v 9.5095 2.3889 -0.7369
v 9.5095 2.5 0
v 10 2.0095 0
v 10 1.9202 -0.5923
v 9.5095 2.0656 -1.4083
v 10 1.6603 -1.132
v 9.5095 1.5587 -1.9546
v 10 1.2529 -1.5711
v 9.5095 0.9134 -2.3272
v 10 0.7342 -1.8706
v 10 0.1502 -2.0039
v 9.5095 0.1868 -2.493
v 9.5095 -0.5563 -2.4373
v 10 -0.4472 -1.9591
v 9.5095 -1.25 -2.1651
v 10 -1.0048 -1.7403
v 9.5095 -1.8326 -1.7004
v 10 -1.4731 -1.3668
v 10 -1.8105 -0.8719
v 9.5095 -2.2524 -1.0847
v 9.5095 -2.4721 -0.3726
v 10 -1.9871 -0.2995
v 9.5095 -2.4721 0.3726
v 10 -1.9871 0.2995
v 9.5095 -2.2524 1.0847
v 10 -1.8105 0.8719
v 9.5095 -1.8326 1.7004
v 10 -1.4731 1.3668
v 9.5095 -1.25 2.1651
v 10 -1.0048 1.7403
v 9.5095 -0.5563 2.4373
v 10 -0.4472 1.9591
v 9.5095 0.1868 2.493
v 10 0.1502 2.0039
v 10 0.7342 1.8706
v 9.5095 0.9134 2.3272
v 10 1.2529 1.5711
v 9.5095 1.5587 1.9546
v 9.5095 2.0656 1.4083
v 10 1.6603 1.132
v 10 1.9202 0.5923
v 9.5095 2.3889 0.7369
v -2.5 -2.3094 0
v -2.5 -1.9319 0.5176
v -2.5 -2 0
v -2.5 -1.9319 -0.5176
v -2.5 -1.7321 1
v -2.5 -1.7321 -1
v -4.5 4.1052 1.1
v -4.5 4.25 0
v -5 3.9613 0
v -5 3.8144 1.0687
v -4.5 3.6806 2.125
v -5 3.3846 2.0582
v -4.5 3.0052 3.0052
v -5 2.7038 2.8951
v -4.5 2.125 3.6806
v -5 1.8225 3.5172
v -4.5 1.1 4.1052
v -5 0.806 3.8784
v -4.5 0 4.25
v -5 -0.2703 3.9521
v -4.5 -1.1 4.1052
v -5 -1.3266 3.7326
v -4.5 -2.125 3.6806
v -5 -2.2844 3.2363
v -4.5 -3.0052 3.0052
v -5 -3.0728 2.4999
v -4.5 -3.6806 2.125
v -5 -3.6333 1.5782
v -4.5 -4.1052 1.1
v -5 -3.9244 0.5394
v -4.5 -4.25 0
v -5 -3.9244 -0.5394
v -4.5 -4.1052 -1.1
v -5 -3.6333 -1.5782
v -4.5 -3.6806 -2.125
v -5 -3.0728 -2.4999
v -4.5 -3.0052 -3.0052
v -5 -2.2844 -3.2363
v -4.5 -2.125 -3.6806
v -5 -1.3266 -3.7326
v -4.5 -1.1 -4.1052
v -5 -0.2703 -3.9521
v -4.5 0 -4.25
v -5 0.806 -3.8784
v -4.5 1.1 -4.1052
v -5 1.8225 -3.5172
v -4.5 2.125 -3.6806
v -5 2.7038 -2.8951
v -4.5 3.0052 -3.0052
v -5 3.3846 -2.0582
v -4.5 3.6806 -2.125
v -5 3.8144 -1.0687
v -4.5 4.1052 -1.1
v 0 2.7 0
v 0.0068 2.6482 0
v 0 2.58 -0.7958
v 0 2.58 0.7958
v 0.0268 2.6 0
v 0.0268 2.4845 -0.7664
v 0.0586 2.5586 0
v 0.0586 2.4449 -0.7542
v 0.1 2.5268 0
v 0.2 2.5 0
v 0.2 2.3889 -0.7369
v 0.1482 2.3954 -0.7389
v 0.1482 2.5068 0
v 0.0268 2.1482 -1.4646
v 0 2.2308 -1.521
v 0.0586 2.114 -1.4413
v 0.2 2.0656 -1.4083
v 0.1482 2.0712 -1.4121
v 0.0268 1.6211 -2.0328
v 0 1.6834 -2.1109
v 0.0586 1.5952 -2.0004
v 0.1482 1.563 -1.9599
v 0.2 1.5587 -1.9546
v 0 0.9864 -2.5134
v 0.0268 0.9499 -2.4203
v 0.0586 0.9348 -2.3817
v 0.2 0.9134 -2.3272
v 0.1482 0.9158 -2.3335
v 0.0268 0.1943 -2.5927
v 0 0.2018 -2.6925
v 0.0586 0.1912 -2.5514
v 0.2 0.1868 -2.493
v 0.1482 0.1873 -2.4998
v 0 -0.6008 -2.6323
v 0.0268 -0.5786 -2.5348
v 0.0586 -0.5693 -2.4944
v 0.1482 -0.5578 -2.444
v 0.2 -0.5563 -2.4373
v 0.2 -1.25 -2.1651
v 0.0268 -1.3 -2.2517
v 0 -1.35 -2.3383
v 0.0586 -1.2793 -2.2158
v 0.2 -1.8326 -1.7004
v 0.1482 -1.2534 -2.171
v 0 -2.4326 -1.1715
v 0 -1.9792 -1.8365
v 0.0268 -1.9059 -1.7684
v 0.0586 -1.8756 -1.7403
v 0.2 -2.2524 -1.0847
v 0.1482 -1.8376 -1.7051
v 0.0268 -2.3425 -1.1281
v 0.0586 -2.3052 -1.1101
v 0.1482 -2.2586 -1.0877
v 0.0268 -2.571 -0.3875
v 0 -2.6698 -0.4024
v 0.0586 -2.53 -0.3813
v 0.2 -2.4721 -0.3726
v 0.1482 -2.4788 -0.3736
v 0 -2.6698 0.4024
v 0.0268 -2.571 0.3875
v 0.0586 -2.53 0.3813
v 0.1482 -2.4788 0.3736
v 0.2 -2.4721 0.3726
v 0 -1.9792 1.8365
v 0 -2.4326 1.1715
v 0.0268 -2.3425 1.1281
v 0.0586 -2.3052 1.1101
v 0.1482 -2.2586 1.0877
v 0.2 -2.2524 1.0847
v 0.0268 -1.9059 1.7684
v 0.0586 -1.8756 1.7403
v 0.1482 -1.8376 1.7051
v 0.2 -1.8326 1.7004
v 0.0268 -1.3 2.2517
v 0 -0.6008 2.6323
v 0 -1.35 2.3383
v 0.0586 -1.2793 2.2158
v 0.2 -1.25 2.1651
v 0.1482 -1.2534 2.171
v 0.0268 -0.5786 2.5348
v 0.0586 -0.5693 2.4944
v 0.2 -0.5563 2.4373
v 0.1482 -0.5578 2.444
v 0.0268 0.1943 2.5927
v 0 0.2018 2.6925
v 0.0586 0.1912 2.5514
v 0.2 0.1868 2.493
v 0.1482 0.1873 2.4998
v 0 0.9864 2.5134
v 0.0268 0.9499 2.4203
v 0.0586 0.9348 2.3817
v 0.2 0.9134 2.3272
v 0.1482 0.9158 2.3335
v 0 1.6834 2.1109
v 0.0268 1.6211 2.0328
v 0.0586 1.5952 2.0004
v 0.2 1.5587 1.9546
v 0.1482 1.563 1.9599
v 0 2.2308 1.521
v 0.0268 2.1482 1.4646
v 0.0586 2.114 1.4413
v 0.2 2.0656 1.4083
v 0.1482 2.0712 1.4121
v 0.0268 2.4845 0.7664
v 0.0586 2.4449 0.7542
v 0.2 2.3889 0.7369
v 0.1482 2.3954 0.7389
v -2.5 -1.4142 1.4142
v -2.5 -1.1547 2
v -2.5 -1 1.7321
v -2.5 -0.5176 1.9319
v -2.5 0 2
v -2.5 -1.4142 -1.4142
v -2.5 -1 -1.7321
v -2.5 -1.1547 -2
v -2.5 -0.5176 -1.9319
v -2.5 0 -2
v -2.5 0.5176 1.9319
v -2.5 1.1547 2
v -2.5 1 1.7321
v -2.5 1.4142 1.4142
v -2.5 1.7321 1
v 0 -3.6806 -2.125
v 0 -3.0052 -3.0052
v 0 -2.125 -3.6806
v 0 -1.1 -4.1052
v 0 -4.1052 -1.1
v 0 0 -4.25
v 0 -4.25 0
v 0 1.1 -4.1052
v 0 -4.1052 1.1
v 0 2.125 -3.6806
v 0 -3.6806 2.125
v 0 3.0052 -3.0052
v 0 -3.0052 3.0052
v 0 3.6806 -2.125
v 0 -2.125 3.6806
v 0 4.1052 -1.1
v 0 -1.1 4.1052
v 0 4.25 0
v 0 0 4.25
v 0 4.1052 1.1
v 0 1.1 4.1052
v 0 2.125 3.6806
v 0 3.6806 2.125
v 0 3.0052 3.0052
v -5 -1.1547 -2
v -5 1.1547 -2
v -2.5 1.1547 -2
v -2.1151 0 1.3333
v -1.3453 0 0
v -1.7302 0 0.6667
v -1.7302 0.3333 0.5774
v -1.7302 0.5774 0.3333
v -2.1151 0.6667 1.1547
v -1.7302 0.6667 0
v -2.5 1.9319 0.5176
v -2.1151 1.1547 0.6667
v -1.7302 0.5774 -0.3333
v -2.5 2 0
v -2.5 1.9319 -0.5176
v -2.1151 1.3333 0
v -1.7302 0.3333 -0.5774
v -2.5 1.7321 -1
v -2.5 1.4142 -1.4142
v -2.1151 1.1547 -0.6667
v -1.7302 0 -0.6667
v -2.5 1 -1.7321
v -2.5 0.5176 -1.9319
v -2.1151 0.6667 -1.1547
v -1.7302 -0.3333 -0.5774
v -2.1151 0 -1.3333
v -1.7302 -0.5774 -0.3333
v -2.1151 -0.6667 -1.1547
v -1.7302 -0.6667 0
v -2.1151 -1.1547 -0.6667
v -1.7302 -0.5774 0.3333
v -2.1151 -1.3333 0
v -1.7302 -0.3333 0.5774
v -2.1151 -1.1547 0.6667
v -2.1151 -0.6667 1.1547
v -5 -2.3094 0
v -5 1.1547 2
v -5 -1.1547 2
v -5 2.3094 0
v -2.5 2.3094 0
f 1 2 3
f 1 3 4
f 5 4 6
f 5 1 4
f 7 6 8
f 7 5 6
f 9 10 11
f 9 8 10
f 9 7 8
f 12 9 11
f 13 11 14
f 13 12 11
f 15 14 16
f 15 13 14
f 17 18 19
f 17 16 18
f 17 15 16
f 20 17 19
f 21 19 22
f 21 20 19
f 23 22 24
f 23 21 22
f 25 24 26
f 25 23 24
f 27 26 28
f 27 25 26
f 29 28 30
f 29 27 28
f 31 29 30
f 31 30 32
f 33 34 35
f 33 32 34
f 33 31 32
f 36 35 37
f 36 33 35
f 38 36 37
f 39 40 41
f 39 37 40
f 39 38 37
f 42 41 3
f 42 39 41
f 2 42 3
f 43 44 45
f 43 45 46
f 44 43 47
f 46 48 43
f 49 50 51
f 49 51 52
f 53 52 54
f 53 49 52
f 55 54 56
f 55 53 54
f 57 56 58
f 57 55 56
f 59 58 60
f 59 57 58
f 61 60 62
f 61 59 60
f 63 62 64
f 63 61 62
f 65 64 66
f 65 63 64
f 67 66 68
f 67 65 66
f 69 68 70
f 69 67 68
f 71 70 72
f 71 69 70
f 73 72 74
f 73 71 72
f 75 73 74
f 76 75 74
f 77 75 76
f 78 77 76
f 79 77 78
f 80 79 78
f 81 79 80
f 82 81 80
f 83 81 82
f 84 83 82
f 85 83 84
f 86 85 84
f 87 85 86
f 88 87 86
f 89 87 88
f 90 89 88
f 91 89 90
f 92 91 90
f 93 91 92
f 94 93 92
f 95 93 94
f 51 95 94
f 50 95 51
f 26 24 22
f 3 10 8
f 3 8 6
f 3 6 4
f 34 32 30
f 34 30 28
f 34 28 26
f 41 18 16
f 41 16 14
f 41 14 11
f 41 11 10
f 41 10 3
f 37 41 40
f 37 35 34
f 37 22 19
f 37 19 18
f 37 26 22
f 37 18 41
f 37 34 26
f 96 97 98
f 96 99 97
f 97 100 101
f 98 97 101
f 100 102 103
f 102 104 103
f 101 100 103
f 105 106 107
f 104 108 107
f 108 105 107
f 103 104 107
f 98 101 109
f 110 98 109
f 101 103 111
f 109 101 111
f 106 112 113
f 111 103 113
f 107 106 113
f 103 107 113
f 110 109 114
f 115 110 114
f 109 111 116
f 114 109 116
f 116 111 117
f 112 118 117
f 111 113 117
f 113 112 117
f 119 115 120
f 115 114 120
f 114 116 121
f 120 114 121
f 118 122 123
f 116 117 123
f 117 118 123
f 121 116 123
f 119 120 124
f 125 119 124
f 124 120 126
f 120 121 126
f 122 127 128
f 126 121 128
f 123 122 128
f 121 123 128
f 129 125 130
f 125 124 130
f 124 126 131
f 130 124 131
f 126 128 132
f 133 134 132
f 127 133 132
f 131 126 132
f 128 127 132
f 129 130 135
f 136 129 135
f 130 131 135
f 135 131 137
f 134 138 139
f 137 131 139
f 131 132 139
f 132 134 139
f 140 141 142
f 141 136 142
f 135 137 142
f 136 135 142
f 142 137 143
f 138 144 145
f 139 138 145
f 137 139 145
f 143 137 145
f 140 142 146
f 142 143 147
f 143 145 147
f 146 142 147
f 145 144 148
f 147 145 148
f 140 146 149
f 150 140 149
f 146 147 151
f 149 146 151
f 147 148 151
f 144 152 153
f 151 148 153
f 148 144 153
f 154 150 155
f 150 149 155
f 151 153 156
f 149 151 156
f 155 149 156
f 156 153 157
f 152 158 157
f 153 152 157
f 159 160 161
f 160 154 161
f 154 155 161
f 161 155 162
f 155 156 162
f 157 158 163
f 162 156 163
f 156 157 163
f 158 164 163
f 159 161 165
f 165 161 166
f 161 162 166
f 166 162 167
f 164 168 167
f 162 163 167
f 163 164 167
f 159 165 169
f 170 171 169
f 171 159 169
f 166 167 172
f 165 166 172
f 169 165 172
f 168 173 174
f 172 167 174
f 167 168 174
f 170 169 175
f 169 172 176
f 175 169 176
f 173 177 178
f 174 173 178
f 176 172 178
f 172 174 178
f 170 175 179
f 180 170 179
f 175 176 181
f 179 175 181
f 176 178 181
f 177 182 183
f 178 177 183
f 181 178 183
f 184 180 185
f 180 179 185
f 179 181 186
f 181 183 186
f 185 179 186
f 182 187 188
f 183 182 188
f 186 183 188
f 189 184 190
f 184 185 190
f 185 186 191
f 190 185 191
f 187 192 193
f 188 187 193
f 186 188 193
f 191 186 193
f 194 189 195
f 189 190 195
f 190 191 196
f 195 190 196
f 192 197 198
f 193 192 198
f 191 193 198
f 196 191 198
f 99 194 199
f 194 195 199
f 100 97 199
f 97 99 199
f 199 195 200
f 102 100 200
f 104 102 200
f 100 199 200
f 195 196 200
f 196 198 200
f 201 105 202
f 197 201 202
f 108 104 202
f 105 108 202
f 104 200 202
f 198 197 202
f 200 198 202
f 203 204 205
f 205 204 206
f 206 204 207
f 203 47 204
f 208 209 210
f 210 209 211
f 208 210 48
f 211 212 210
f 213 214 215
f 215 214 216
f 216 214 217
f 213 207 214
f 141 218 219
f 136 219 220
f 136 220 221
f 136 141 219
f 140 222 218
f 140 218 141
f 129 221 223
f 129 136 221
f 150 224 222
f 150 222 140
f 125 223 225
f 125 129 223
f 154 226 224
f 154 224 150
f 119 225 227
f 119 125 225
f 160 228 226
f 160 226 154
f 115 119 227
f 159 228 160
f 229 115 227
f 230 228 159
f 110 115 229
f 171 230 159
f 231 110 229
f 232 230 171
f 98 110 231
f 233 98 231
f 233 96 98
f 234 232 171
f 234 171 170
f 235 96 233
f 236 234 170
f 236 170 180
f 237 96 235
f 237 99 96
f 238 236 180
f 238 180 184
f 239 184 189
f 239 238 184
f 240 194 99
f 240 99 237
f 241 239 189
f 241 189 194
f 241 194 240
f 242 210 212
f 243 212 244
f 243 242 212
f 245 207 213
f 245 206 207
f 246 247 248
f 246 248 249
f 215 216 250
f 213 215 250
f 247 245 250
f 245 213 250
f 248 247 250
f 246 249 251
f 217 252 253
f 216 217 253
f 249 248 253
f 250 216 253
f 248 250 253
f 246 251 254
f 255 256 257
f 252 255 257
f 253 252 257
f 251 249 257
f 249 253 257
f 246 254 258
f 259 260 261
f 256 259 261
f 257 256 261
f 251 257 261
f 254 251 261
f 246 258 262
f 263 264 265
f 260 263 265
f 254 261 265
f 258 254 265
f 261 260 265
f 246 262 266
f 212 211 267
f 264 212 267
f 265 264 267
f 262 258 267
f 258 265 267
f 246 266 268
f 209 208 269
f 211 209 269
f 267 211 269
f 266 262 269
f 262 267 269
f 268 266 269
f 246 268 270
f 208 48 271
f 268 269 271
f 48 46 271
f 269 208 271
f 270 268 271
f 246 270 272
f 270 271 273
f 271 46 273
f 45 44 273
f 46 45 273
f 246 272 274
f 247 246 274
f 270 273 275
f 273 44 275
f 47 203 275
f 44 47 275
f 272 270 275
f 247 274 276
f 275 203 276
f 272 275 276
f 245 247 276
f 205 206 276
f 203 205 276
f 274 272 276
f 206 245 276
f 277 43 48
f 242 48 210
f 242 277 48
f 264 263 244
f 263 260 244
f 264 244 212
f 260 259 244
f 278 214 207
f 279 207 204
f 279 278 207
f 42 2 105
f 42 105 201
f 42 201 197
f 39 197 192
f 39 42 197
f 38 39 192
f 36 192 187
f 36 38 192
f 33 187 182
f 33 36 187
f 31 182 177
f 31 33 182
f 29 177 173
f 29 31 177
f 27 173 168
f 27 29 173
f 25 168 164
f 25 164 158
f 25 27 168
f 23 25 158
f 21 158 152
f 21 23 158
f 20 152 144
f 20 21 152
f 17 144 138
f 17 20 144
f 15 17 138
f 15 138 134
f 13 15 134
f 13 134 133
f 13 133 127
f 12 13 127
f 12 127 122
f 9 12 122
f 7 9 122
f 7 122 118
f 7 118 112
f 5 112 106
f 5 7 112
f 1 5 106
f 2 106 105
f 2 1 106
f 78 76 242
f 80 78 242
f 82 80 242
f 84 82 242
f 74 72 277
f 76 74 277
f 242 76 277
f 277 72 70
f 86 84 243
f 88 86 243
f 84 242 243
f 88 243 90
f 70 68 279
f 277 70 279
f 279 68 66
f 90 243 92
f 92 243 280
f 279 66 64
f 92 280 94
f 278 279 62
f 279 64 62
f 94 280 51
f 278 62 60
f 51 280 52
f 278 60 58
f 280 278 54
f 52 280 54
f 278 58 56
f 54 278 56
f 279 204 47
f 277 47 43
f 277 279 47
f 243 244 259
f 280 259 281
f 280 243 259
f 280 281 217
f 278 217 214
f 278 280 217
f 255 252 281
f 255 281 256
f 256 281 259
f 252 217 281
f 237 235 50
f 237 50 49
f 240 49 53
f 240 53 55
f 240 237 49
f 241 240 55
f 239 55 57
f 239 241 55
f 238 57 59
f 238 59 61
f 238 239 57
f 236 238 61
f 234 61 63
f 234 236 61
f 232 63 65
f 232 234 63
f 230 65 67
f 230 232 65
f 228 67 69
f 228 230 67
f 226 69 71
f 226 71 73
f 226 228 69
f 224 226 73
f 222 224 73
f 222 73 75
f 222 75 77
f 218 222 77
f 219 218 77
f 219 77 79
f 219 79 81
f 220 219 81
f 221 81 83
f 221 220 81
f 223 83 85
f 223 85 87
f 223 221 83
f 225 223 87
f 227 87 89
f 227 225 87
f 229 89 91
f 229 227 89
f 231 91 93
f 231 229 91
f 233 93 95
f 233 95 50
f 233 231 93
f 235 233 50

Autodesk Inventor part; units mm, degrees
sketch "Sketch_8" plane through (0, 0, 0) normal (0, 0, 1) x (1, 0, 0)
  line L0 (10, 0) -> (-5, 0)
  line L1 (-5, 0) -> (-5, 3.9613)
  line L2 (-5, 3.9613) -> (-4.5, 4.25)
  line L3 (-4.5, 4.25) -> (0, 4.25)
  line L4 (0, 4.25) -> (0, 2.7)
  arc A0 (0, 2.7) -> (0.2, 2.5) centre (0.2, 2.7) ccw
  line L5 (0.2, 2.5) -> (9.5095, 2.5)
  line L6 (9.5095, 2.5) -> (10, 2.0095)
  line L7 (10, 2.0095) -> (10, 0)
  line L8 (10, 0) -> (-5, 0)
revolve "Revolution1" add sketch "Sketch_8" angle 360 about axis through (10, 0, 0) along (1, 0, 0)
thread "Thread1" size "M5x0.8" class "6g" standard "ISO Metric profile" full length
sketch "Sketch2" plane through (-5, 0, 0) normal (-1, 0, 0) x (0, 0, 1)
  point P0 (0, 0)
hole "Hole1" at (-5, 0, 0) direction (1, 0, 0) diameter 4 depth 2.5 tip angle 120
sketch "Sketch_3" plane through (-5, 0, 0) normal (1, 0, 0) x (0, 0, -1)
  line L0 (-2, -1.1547) -> (0, -2.3094)
  line L1 (0, -2.3094) -> (2, -1.1547)
  line L2 (2, -1.1547) -> (2, 1.1547)
  line L3 (2, 1.1547) -> (0, 2.3094)
  line L4 (0, 2.3094) -> (-2, 1.1547)
  line L5 (-2, 1.1547) -> (-2, -1.1547)
extrude "Extrusion1" cut sketch "Sketch_3" along normal blind 2.5
ref_plane "bolt_XY" through (0, 0, 0) normal (1, 0, 0) x (0, 0, -1)
ref_plane "bolt_YZ" through (0, 0, 0) normal (0, 0, -1) x (0, 1, 0)
ref_plane "bolt_ZX" through (0, 0, 0) normal (0, 1, 0) x (1, 0, 0)
ref_plane "nut_XY" through (10, 0, 0) normal (1, 0, 0) x (0, 0, -1)
ref_plane "nut_YZ" through (10, 0, 0) normal (0, 0, -1) x (0, 1, 0)
ref_plane "nut_ZX" through (10, 0, 0) normal (0, 1, 0) x (1, 0, 0)
properties part number "CBM5-10"
